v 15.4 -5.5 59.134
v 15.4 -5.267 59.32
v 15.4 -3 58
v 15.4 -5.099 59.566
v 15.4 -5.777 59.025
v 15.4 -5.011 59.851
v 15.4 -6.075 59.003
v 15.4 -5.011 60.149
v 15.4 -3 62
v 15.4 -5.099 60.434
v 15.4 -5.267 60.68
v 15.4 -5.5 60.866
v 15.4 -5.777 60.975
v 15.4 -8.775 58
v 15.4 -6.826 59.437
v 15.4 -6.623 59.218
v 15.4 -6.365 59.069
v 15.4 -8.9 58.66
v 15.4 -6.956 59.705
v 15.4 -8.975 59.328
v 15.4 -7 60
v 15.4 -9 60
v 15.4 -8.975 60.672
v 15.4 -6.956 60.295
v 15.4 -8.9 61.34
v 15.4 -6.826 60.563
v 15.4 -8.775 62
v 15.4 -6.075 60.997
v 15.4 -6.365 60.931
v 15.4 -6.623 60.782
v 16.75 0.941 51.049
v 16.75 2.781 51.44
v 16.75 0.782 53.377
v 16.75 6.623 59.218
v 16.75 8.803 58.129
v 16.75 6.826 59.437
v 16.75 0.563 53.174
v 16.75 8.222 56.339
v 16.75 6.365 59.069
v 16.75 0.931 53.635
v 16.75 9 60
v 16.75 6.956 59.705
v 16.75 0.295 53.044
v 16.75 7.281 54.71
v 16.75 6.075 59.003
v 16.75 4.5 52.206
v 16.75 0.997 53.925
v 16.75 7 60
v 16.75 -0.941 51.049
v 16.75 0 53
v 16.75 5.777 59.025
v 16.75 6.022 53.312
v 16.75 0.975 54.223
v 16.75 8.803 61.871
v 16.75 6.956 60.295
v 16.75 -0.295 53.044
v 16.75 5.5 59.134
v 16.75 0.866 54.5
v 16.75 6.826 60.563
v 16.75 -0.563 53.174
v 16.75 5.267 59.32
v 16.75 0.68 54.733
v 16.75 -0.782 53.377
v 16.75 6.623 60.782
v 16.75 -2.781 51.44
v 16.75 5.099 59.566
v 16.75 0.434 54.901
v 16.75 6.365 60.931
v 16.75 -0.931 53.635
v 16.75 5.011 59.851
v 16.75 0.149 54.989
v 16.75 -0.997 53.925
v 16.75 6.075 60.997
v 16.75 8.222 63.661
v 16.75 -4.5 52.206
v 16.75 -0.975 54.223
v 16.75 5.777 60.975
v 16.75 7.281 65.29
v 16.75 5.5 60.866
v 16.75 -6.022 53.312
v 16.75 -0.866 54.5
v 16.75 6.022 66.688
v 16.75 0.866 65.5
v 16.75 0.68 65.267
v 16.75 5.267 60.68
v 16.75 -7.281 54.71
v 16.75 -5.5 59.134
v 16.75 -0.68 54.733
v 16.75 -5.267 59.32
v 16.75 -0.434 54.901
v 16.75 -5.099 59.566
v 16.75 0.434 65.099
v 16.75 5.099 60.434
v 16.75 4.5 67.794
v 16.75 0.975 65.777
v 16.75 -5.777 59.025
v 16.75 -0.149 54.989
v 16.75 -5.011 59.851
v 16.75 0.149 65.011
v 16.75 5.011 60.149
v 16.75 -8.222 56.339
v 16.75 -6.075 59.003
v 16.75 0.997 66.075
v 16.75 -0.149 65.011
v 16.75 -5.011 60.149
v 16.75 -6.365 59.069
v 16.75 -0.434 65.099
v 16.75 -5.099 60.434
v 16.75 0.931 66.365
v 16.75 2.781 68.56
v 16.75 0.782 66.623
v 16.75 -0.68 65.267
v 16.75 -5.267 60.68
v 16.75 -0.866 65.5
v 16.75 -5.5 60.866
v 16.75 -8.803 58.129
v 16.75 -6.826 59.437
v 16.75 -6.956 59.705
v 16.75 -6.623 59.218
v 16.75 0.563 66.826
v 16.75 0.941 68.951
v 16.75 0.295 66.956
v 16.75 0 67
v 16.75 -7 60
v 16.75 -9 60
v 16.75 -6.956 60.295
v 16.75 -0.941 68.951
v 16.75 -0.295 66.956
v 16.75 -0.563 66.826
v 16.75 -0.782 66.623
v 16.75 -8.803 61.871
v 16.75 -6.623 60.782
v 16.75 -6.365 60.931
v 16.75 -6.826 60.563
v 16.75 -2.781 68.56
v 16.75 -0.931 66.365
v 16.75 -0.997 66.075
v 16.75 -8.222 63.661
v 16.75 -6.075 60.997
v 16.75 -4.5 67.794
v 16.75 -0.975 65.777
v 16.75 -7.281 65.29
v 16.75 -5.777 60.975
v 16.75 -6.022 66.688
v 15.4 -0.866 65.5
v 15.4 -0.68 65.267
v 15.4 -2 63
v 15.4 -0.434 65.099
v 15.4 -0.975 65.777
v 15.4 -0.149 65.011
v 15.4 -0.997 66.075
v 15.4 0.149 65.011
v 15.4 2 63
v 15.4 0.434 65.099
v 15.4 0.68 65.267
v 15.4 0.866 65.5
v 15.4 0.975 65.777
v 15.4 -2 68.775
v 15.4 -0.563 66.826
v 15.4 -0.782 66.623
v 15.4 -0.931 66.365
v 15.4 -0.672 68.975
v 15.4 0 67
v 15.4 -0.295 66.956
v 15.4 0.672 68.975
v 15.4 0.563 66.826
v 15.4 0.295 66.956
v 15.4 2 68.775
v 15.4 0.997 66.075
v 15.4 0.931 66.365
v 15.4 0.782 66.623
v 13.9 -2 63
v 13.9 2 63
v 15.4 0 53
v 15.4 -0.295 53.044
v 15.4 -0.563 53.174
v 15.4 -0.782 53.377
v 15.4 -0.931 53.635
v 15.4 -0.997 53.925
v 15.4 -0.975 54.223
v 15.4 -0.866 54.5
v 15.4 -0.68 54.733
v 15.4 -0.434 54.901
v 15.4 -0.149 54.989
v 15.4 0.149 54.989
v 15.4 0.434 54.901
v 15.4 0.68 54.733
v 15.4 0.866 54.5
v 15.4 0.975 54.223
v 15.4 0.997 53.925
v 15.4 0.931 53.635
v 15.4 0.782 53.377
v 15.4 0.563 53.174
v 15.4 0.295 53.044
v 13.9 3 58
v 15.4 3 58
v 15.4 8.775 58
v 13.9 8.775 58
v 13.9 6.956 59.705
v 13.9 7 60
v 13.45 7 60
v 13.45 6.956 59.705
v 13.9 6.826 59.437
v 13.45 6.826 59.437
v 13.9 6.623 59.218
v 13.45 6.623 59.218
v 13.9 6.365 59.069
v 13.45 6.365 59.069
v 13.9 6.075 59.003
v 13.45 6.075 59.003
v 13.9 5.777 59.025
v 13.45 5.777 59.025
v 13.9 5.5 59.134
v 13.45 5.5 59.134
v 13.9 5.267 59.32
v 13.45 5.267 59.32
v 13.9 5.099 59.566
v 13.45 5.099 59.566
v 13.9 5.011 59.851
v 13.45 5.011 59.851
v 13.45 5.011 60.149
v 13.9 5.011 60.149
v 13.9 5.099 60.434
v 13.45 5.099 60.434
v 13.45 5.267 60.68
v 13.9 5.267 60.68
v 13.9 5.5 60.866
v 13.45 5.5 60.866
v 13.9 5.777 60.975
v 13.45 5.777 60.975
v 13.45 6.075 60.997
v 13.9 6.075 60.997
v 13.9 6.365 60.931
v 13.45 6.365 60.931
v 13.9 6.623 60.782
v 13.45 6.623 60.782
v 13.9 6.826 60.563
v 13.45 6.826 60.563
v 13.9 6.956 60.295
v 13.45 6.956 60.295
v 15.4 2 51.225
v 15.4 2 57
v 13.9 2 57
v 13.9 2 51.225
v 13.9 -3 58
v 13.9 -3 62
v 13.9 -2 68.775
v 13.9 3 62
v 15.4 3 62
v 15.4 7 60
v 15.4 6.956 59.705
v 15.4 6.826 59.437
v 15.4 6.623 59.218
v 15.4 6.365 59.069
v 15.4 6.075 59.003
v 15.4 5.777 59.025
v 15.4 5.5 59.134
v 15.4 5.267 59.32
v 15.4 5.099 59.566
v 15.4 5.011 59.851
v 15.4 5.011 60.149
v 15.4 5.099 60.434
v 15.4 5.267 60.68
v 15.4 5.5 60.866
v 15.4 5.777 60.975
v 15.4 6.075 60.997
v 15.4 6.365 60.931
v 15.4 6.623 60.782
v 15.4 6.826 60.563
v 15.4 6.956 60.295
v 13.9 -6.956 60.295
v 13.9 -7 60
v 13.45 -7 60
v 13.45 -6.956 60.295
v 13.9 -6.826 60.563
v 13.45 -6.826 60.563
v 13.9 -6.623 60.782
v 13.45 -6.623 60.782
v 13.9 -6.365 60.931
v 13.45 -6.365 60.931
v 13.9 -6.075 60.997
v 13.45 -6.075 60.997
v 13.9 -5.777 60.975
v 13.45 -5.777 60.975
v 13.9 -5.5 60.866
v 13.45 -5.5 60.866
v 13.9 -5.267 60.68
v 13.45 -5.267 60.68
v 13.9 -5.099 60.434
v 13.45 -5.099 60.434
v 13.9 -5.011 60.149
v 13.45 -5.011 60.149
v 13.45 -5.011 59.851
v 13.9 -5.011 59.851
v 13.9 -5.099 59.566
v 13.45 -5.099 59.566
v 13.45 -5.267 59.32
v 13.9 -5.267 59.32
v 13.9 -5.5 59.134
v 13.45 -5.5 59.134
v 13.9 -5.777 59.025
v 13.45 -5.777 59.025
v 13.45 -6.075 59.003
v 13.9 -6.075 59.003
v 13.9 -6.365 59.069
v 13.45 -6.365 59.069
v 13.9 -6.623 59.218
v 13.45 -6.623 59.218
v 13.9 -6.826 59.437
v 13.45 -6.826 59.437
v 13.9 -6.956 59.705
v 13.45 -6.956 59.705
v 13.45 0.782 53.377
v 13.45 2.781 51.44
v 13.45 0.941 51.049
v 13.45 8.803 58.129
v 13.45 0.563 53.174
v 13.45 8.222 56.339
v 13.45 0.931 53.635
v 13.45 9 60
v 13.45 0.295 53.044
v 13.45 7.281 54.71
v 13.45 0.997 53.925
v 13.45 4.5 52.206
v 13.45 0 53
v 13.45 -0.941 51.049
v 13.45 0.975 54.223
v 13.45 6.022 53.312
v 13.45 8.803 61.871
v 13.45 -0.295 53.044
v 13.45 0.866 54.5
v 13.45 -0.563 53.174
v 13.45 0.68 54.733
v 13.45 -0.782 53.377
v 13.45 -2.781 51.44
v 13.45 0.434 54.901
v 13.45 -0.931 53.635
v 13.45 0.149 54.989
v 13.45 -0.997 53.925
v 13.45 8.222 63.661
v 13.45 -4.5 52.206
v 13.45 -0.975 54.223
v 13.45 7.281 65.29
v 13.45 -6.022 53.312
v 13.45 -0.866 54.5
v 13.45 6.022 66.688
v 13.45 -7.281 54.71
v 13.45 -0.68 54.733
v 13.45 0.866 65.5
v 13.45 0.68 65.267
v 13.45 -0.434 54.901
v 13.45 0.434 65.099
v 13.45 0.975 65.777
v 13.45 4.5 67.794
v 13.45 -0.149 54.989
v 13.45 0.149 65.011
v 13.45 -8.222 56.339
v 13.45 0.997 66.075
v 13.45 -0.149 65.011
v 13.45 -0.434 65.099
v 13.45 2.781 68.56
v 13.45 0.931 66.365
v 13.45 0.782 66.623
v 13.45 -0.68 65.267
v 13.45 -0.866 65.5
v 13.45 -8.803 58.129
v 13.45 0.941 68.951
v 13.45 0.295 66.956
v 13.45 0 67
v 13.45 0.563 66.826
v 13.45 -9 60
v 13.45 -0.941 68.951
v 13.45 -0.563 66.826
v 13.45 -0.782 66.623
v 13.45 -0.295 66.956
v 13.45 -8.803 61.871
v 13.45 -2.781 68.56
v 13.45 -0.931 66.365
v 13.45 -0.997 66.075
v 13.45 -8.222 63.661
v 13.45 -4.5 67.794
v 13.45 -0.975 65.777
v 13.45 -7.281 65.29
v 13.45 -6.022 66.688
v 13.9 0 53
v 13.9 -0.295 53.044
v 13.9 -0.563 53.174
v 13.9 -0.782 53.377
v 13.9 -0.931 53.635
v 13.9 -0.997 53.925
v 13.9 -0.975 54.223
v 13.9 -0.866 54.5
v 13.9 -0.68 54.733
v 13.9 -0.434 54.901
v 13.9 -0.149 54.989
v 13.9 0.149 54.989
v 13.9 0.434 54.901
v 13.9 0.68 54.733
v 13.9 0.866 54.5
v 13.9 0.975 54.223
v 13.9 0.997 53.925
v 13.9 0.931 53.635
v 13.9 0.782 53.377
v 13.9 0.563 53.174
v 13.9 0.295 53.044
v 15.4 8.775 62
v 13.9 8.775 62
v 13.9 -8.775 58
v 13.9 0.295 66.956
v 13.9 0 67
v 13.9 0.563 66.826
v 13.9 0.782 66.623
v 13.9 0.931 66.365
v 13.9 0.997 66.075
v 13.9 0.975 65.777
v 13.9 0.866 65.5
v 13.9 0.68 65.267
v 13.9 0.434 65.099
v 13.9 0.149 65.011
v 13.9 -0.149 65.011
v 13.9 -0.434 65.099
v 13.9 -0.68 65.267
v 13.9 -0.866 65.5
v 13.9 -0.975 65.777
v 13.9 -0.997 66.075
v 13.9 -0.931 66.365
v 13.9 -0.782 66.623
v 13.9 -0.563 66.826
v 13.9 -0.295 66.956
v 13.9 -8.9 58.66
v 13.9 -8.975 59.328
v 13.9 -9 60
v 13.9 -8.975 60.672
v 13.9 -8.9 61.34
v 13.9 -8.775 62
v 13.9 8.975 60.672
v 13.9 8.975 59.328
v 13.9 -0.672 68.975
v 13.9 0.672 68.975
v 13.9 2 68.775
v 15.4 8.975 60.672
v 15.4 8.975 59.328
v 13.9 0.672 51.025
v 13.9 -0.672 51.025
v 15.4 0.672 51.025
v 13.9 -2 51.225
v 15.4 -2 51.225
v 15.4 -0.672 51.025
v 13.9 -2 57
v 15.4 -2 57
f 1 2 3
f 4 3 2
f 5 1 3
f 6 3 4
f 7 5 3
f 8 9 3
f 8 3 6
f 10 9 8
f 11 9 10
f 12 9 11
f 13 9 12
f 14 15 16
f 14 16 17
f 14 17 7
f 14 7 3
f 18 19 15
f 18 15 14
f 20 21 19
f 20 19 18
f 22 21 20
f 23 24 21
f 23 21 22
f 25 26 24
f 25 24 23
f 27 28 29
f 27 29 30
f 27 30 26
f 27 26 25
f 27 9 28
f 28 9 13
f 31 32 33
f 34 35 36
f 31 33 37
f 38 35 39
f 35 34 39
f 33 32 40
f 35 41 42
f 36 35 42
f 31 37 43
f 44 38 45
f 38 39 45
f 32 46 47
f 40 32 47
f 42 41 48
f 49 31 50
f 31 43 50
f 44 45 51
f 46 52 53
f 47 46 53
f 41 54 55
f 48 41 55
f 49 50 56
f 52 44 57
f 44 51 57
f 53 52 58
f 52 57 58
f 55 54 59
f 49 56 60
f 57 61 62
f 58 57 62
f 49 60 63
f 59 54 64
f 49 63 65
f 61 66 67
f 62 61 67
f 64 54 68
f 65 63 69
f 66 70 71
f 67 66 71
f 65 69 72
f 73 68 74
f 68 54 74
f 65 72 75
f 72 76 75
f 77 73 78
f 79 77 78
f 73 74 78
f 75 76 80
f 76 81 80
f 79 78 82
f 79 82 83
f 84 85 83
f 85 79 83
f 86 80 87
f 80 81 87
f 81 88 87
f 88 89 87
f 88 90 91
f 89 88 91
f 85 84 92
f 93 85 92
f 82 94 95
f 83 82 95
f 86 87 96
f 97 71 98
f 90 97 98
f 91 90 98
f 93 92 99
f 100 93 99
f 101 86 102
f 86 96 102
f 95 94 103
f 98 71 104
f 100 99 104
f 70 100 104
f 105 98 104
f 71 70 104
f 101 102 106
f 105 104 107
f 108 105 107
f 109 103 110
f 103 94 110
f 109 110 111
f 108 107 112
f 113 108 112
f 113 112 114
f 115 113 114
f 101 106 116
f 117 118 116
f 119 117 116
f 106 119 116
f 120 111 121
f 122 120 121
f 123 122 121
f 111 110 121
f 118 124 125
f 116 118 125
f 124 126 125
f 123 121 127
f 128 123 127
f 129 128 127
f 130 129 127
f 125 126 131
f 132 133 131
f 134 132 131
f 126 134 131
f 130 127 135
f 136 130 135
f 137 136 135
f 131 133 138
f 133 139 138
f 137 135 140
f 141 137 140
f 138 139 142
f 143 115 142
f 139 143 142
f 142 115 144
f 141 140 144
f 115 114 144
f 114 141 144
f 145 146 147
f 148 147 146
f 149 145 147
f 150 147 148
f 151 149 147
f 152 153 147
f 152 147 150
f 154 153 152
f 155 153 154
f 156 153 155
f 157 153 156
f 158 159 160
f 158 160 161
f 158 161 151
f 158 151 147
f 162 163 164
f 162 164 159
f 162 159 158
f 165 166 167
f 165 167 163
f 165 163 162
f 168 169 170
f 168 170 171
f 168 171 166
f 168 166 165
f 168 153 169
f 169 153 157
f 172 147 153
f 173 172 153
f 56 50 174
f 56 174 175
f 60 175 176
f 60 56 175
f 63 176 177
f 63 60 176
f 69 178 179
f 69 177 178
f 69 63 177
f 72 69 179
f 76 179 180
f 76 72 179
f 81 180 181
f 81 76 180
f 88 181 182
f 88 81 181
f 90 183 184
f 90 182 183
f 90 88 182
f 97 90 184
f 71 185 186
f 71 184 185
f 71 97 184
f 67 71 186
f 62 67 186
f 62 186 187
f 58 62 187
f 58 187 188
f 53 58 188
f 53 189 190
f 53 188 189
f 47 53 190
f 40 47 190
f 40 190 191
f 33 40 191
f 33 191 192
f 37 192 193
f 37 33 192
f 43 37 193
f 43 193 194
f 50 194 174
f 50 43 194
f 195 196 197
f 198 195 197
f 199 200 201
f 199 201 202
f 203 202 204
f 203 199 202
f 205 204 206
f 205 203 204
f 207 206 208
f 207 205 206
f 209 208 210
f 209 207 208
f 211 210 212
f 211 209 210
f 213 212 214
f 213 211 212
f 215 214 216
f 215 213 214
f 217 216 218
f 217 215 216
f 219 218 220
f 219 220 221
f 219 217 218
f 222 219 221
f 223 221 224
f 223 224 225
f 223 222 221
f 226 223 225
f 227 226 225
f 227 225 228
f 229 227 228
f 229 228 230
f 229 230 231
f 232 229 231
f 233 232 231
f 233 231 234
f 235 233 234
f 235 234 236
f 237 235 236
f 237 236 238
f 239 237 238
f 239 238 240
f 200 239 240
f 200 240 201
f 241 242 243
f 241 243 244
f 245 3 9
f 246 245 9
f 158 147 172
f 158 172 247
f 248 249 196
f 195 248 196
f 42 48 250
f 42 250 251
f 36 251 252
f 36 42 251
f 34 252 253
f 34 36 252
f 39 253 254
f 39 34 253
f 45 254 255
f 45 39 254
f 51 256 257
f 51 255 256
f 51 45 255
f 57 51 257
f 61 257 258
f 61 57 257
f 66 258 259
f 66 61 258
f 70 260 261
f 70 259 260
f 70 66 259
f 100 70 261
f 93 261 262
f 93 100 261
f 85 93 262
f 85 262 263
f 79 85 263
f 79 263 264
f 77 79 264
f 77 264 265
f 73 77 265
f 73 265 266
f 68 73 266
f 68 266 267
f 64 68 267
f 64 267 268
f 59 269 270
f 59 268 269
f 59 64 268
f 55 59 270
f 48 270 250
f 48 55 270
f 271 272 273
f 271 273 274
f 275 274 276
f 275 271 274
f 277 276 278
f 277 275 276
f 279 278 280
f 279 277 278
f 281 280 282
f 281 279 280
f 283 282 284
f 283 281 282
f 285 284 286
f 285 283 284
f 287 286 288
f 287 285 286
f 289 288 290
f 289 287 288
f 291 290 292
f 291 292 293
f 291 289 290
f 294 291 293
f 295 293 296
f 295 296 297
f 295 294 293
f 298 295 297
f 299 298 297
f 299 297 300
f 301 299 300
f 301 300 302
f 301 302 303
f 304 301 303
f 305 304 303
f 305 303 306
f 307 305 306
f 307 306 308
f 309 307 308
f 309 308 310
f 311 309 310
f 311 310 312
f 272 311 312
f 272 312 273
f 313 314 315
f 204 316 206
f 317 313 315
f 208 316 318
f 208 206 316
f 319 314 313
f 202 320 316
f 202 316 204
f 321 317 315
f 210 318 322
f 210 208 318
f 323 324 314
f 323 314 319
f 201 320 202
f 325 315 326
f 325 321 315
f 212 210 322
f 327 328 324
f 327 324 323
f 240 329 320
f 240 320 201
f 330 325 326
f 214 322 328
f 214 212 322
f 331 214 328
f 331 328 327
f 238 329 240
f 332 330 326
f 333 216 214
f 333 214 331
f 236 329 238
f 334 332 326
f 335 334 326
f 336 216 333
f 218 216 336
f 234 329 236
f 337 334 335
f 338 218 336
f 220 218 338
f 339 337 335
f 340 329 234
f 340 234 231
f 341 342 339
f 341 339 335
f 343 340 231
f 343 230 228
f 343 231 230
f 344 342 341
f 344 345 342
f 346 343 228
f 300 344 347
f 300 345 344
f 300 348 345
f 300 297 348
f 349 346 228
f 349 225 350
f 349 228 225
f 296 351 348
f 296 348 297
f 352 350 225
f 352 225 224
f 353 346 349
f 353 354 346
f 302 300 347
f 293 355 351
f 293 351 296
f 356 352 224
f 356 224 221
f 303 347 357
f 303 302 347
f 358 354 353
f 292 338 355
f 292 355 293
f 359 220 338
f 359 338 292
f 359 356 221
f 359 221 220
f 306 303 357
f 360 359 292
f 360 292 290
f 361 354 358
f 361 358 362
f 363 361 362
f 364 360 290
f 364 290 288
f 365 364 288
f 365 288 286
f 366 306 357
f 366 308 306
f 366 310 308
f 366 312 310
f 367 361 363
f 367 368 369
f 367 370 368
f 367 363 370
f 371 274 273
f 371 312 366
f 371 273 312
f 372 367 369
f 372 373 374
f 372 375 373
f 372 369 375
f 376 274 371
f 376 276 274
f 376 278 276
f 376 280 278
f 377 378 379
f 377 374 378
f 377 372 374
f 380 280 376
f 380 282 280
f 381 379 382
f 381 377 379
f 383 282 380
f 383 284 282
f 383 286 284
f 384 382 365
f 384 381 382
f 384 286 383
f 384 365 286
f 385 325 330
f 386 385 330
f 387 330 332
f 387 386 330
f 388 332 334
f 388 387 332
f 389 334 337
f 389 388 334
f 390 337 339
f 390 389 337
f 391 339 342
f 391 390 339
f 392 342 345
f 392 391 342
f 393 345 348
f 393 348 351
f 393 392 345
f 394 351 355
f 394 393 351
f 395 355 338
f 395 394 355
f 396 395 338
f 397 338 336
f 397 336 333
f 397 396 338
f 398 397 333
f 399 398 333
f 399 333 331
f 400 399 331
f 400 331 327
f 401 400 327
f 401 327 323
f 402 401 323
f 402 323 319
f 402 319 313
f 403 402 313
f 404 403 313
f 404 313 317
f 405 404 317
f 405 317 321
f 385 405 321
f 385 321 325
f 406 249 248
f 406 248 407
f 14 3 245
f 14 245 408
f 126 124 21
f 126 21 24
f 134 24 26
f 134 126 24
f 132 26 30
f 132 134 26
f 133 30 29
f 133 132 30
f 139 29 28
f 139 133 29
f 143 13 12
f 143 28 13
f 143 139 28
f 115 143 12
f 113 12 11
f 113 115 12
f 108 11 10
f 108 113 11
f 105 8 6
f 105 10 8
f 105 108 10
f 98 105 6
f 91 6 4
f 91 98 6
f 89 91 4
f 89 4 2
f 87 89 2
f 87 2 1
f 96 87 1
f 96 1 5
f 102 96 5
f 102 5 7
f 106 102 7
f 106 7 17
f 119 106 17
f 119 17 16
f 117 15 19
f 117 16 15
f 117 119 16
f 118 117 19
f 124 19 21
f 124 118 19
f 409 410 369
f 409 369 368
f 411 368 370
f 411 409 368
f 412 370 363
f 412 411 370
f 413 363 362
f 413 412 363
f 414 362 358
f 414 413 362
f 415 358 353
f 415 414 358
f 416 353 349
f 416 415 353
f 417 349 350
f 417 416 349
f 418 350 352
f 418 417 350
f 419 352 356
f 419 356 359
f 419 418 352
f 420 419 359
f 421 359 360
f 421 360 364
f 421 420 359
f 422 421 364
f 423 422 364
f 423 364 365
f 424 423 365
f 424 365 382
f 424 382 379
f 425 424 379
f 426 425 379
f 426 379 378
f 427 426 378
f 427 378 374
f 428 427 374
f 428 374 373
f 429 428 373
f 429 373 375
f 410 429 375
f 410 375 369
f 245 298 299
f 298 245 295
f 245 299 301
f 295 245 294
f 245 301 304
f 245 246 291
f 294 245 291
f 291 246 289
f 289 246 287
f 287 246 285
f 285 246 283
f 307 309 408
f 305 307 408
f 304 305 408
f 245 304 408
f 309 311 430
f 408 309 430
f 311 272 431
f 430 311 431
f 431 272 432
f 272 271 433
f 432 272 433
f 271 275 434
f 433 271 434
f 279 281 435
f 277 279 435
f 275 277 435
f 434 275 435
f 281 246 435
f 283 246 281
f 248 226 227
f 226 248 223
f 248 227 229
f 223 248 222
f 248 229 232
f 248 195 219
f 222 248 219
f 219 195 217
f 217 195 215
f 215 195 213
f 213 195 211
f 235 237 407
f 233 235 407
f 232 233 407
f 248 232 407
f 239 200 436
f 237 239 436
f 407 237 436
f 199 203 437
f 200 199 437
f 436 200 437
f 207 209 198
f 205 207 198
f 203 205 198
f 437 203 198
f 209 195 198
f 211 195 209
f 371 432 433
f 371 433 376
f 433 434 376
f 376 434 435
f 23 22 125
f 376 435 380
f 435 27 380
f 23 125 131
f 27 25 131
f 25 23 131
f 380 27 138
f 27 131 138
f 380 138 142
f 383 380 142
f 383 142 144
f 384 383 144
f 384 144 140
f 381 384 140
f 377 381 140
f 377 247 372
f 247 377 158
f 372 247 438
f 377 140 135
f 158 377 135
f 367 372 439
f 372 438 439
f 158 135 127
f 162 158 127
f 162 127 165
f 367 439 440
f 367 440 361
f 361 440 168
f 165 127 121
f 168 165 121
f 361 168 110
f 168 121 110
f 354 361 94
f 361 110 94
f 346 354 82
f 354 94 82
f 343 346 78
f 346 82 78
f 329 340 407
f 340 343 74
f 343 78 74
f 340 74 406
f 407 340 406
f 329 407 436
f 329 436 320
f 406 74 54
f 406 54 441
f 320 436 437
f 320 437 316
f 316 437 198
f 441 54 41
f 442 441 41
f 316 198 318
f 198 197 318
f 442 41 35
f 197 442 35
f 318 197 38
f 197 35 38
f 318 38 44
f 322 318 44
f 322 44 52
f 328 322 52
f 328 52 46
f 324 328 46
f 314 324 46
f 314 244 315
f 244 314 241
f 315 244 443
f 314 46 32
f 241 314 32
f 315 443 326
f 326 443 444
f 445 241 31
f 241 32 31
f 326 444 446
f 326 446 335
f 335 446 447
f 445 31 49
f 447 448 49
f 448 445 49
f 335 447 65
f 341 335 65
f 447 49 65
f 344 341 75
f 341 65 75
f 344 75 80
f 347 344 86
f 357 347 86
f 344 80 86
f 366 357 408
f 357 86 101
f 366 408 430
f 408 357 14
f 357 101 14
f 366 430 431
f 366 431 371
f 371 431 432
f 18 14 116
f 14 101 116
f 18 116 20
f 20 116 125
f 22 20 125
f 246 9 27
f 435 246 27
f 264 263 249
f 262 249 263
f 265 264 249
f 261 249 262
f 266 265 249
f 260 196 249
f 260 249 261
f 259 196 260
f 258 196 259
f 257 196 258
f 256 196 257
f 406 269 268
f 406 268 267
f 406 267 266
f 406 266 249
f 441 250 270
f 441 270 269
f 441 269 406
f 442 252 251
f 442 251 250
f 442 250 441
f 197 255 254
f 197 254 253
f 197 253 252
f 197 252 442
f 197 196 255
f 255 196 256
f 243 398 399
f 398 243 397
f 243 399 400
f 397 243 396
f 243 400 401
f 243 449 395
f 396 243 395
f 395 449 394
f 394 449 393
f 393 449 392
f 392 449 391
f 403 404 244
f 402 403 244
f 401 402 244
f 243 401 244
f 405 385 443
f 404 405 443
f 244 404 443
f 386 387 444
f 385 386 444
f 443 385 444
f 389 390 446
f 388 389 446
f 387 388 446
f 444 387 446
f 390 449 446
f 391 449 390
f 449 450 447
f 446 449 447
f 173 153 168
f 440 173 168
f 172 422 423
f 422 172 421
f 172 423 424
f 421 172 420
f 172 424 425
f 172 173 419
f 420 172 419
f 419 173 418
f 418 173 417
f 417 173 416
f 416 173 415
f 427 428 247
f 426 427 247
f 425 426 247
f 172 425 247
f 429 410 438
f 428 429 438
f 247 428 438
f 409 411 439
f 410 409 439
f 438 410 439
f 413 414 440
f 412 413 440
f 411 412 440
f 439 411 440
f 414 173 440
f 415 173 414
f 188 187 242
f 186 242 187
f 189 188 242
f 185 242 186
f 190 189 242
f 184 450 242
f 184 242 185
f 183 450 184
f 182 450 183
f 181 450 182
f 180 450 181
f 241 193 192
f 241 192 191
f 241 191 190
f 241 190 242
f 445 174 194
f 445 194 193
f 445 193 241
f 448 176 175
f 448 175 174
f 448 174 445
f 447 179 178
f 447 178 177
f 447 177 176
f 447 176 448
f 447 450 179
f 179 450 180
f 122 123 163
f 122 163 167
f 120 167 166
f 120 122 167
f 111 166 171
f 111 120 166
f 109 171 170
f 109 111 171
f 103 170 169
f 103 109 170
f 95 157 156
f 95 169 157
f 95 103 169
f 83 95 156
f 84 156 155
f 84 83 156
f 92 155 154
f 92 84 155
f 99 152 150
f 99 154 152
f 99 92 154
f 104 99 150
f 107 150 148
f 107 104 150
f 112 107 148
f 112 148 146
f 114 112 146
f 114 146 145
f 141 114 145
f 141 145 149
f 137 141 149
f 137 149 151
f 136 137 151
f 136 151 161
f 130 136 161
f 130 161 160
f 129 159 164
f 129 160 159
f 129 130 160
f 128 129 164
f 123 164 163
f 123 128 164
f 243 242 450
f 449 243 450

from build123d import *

# Parameters (mm, degrees)
BOX043_W                    = 6
BOX043_H                    = 4
BOX043_DEPTH                = 1.5
BOX046_W                    = 6
BOX046_H                    = 4
BOX046_DEPTH                = 1.5
BOX045_W                    = 6
BOX045_H                    = 4
BOX045_DEPTH                = 1.5
BOX044_W                    = 6
BOX044_H                    = 4
BOX044_DEPTH                = 1.5
COMPOUND834_ROLL_ANGLE      = 90
COMPOUND834_PLACEMENT_ANGLE = -90
CYLINDER496_R               = 1
CYLINDER496_DEPTH           = 10
CYLINDER497_R               = 1
CYLINDER497_DEPTH           = 10
CYLINDER495_R               = 1
CYLINDER495_DEPTH           = 10
CYLINDER494_R               = 1
CYLINDER494_DEPTH           = 10
COMPOUND833_ROLL_ANGLE      = 90
COMPOUND833_PLACEMENT_ANGLE = -90
CYLINDER493_R               = 9
CYLINDER493_DEPTH           = 3.3


with BuildPart() as krychle043:
    # Box043 → Box043 (new body)
    with BuildSketch(Plane(origin=(2, 3, -9.4), x_dir=(0, 1, 0), z_dir=(0, 0, 1))):
        with Locations((3, 2)):
            Rectangle(BOX043_W, BOX043_H)
    extrude(amount=BOX043_DEPTH)


with BuildPart() as krychle046:
    # Box046 → Box046 (new body)
    with BuildSketch(Plane(origin=(-3, 2, -9.4), x_dir=(-1, 0, 0), z_dir=(0, 0, 1))):
        with Locations((3, 2)):
            Rectangle(BOX046_W, BOX046_H)
    extrude(amount=BOX046_DEPTH)


with BuildPart() as krychle045:
    # Box045 → Box045 (new body)
    with BuildSketch(Plane(origin=(-2, -3, -9.4), x_dir=(0, -1, 0), z_dir=(0, 0, 1))):
        with Locations((3, 2)):
            Rectangle(BOX045_W, BOX045_H)
    extrude(amount=BOX045_DEPTH)


with BuildPart() as compound834:
    # Box044 → Box044 (new body)
    with BuildSketch(Plane(origin=(3, -2, -9.4), x_dir=(1, 0, 0), z_dir=(0, 0, 1))):
        with Locations((3, 2)):
            Rectangle(BOX044_W, BOX044_H)
    extrude(amount=BOX044_DEPTH)

    # Compound834: union Krychle043, Krychle046, Krychle045
    add(krychle043.part)
    add(krychle046.part)
    add(krychle045.part)


with BuildPart() as compound834_1:
    # Compound834 roll: moved
    add(compound834.part.rotate(Axis((0, 0, 0), (1, 0, 0)), COMPOUND834_ROLL_ANGLE))


with BuildPart() as compound834_2:
    # Compound834 placement: moved
    add(compound834_1.part.moved(Location((6, 0, 60))).rotate(Axis((6, 0, 60), (0, 0, 1)), COMPOUND834_PLACEMENT_ANGLE))


with BuildPart() as v_lec496:
    # Cylinder496 → Cylinder496 (new body)
    with BuildSketch(Plane(origin=(0, 6, -9.6), x_dir=(0, 1, 0), z_dir=(0, 0, 1))):
        Circle(CYLINDER496_R)
    extrude(amount=CYLINDER496_DEPTH)


with BuildPart() as v_lec497:
    # Cylinder497 → Cylinder497 (new body)
    with BuildSketch(Plane(origin=(-6, 0, -9.6), x_dir=(-1, 0, 0), z_dir=(0, 0, 1))):
        Circle(CYLINDER497_R)
    extrude(amount=CYLINDER497_DEPTH)


with BuildPart() as v_lec495:
    # Cylinder495 → Cylinder495 (new body)
    with BuildSketch(Plane(origin=(0, -6, -9.6), x_dir=(0, -1, 0), z_dir=(0, 0, 1))):
        Circle(CYLINDER495_R)
    extrude(amount=CYLINDER495_DEPTH)


with BuildPart() as compound833:
    # Cylinder494 → Cylinder494 (new body)
    with BuildSketch(Plane(origin=(6, 0, -9.6), x_dir=(1, 0, 0), z_dir=(0, 0, 1))):
        Circle(CYLINDER494_R)
    extrude(amount=CYLINDER494_DEPTH)

    # Compound833: union Válec496, Válec497, Válec495
    add(v_lec496.part)
    add(v_lec497.part)
    add(v_lec495.part)


with BuildPart() as compound833_1:
    # Compound833 roll: moved
    add(compound833.part.rotate(Axis((0, 0, 0), (1, 0, 0)), COMPOUND833_ROLL_ANGLE))


with BuildPart() as compound833_2:
    # Compound833 placement: moved
    add(compound833_1.part.moved(Location((13.85, 0, 60))).rotate(Axis((13.85, 0, 60), (0, 0, 1)), COMPOUND833_PLACEMENT_ANGLE))


with BuildPart() as cut657:
    # Cylinder493 → Cylinder493 (new body)
    with BuildSketch(Plane(origin=(16.75, 0, 60), x_dir=(0, -1, 0), z_dir=(-1, 0, 0))):
        Circle(CYLINDER493_R)
    extrude(amount=CYLINDER493_DEPTH)

    # Cut656: cut Compound833
    add(compound833_2.part, mode=Mode.SUBTRACT)

    # Cut657: cut Compound834
    add(compound834_2.part, mode=Mode.SUBTRACT)


solid = cut657.part
